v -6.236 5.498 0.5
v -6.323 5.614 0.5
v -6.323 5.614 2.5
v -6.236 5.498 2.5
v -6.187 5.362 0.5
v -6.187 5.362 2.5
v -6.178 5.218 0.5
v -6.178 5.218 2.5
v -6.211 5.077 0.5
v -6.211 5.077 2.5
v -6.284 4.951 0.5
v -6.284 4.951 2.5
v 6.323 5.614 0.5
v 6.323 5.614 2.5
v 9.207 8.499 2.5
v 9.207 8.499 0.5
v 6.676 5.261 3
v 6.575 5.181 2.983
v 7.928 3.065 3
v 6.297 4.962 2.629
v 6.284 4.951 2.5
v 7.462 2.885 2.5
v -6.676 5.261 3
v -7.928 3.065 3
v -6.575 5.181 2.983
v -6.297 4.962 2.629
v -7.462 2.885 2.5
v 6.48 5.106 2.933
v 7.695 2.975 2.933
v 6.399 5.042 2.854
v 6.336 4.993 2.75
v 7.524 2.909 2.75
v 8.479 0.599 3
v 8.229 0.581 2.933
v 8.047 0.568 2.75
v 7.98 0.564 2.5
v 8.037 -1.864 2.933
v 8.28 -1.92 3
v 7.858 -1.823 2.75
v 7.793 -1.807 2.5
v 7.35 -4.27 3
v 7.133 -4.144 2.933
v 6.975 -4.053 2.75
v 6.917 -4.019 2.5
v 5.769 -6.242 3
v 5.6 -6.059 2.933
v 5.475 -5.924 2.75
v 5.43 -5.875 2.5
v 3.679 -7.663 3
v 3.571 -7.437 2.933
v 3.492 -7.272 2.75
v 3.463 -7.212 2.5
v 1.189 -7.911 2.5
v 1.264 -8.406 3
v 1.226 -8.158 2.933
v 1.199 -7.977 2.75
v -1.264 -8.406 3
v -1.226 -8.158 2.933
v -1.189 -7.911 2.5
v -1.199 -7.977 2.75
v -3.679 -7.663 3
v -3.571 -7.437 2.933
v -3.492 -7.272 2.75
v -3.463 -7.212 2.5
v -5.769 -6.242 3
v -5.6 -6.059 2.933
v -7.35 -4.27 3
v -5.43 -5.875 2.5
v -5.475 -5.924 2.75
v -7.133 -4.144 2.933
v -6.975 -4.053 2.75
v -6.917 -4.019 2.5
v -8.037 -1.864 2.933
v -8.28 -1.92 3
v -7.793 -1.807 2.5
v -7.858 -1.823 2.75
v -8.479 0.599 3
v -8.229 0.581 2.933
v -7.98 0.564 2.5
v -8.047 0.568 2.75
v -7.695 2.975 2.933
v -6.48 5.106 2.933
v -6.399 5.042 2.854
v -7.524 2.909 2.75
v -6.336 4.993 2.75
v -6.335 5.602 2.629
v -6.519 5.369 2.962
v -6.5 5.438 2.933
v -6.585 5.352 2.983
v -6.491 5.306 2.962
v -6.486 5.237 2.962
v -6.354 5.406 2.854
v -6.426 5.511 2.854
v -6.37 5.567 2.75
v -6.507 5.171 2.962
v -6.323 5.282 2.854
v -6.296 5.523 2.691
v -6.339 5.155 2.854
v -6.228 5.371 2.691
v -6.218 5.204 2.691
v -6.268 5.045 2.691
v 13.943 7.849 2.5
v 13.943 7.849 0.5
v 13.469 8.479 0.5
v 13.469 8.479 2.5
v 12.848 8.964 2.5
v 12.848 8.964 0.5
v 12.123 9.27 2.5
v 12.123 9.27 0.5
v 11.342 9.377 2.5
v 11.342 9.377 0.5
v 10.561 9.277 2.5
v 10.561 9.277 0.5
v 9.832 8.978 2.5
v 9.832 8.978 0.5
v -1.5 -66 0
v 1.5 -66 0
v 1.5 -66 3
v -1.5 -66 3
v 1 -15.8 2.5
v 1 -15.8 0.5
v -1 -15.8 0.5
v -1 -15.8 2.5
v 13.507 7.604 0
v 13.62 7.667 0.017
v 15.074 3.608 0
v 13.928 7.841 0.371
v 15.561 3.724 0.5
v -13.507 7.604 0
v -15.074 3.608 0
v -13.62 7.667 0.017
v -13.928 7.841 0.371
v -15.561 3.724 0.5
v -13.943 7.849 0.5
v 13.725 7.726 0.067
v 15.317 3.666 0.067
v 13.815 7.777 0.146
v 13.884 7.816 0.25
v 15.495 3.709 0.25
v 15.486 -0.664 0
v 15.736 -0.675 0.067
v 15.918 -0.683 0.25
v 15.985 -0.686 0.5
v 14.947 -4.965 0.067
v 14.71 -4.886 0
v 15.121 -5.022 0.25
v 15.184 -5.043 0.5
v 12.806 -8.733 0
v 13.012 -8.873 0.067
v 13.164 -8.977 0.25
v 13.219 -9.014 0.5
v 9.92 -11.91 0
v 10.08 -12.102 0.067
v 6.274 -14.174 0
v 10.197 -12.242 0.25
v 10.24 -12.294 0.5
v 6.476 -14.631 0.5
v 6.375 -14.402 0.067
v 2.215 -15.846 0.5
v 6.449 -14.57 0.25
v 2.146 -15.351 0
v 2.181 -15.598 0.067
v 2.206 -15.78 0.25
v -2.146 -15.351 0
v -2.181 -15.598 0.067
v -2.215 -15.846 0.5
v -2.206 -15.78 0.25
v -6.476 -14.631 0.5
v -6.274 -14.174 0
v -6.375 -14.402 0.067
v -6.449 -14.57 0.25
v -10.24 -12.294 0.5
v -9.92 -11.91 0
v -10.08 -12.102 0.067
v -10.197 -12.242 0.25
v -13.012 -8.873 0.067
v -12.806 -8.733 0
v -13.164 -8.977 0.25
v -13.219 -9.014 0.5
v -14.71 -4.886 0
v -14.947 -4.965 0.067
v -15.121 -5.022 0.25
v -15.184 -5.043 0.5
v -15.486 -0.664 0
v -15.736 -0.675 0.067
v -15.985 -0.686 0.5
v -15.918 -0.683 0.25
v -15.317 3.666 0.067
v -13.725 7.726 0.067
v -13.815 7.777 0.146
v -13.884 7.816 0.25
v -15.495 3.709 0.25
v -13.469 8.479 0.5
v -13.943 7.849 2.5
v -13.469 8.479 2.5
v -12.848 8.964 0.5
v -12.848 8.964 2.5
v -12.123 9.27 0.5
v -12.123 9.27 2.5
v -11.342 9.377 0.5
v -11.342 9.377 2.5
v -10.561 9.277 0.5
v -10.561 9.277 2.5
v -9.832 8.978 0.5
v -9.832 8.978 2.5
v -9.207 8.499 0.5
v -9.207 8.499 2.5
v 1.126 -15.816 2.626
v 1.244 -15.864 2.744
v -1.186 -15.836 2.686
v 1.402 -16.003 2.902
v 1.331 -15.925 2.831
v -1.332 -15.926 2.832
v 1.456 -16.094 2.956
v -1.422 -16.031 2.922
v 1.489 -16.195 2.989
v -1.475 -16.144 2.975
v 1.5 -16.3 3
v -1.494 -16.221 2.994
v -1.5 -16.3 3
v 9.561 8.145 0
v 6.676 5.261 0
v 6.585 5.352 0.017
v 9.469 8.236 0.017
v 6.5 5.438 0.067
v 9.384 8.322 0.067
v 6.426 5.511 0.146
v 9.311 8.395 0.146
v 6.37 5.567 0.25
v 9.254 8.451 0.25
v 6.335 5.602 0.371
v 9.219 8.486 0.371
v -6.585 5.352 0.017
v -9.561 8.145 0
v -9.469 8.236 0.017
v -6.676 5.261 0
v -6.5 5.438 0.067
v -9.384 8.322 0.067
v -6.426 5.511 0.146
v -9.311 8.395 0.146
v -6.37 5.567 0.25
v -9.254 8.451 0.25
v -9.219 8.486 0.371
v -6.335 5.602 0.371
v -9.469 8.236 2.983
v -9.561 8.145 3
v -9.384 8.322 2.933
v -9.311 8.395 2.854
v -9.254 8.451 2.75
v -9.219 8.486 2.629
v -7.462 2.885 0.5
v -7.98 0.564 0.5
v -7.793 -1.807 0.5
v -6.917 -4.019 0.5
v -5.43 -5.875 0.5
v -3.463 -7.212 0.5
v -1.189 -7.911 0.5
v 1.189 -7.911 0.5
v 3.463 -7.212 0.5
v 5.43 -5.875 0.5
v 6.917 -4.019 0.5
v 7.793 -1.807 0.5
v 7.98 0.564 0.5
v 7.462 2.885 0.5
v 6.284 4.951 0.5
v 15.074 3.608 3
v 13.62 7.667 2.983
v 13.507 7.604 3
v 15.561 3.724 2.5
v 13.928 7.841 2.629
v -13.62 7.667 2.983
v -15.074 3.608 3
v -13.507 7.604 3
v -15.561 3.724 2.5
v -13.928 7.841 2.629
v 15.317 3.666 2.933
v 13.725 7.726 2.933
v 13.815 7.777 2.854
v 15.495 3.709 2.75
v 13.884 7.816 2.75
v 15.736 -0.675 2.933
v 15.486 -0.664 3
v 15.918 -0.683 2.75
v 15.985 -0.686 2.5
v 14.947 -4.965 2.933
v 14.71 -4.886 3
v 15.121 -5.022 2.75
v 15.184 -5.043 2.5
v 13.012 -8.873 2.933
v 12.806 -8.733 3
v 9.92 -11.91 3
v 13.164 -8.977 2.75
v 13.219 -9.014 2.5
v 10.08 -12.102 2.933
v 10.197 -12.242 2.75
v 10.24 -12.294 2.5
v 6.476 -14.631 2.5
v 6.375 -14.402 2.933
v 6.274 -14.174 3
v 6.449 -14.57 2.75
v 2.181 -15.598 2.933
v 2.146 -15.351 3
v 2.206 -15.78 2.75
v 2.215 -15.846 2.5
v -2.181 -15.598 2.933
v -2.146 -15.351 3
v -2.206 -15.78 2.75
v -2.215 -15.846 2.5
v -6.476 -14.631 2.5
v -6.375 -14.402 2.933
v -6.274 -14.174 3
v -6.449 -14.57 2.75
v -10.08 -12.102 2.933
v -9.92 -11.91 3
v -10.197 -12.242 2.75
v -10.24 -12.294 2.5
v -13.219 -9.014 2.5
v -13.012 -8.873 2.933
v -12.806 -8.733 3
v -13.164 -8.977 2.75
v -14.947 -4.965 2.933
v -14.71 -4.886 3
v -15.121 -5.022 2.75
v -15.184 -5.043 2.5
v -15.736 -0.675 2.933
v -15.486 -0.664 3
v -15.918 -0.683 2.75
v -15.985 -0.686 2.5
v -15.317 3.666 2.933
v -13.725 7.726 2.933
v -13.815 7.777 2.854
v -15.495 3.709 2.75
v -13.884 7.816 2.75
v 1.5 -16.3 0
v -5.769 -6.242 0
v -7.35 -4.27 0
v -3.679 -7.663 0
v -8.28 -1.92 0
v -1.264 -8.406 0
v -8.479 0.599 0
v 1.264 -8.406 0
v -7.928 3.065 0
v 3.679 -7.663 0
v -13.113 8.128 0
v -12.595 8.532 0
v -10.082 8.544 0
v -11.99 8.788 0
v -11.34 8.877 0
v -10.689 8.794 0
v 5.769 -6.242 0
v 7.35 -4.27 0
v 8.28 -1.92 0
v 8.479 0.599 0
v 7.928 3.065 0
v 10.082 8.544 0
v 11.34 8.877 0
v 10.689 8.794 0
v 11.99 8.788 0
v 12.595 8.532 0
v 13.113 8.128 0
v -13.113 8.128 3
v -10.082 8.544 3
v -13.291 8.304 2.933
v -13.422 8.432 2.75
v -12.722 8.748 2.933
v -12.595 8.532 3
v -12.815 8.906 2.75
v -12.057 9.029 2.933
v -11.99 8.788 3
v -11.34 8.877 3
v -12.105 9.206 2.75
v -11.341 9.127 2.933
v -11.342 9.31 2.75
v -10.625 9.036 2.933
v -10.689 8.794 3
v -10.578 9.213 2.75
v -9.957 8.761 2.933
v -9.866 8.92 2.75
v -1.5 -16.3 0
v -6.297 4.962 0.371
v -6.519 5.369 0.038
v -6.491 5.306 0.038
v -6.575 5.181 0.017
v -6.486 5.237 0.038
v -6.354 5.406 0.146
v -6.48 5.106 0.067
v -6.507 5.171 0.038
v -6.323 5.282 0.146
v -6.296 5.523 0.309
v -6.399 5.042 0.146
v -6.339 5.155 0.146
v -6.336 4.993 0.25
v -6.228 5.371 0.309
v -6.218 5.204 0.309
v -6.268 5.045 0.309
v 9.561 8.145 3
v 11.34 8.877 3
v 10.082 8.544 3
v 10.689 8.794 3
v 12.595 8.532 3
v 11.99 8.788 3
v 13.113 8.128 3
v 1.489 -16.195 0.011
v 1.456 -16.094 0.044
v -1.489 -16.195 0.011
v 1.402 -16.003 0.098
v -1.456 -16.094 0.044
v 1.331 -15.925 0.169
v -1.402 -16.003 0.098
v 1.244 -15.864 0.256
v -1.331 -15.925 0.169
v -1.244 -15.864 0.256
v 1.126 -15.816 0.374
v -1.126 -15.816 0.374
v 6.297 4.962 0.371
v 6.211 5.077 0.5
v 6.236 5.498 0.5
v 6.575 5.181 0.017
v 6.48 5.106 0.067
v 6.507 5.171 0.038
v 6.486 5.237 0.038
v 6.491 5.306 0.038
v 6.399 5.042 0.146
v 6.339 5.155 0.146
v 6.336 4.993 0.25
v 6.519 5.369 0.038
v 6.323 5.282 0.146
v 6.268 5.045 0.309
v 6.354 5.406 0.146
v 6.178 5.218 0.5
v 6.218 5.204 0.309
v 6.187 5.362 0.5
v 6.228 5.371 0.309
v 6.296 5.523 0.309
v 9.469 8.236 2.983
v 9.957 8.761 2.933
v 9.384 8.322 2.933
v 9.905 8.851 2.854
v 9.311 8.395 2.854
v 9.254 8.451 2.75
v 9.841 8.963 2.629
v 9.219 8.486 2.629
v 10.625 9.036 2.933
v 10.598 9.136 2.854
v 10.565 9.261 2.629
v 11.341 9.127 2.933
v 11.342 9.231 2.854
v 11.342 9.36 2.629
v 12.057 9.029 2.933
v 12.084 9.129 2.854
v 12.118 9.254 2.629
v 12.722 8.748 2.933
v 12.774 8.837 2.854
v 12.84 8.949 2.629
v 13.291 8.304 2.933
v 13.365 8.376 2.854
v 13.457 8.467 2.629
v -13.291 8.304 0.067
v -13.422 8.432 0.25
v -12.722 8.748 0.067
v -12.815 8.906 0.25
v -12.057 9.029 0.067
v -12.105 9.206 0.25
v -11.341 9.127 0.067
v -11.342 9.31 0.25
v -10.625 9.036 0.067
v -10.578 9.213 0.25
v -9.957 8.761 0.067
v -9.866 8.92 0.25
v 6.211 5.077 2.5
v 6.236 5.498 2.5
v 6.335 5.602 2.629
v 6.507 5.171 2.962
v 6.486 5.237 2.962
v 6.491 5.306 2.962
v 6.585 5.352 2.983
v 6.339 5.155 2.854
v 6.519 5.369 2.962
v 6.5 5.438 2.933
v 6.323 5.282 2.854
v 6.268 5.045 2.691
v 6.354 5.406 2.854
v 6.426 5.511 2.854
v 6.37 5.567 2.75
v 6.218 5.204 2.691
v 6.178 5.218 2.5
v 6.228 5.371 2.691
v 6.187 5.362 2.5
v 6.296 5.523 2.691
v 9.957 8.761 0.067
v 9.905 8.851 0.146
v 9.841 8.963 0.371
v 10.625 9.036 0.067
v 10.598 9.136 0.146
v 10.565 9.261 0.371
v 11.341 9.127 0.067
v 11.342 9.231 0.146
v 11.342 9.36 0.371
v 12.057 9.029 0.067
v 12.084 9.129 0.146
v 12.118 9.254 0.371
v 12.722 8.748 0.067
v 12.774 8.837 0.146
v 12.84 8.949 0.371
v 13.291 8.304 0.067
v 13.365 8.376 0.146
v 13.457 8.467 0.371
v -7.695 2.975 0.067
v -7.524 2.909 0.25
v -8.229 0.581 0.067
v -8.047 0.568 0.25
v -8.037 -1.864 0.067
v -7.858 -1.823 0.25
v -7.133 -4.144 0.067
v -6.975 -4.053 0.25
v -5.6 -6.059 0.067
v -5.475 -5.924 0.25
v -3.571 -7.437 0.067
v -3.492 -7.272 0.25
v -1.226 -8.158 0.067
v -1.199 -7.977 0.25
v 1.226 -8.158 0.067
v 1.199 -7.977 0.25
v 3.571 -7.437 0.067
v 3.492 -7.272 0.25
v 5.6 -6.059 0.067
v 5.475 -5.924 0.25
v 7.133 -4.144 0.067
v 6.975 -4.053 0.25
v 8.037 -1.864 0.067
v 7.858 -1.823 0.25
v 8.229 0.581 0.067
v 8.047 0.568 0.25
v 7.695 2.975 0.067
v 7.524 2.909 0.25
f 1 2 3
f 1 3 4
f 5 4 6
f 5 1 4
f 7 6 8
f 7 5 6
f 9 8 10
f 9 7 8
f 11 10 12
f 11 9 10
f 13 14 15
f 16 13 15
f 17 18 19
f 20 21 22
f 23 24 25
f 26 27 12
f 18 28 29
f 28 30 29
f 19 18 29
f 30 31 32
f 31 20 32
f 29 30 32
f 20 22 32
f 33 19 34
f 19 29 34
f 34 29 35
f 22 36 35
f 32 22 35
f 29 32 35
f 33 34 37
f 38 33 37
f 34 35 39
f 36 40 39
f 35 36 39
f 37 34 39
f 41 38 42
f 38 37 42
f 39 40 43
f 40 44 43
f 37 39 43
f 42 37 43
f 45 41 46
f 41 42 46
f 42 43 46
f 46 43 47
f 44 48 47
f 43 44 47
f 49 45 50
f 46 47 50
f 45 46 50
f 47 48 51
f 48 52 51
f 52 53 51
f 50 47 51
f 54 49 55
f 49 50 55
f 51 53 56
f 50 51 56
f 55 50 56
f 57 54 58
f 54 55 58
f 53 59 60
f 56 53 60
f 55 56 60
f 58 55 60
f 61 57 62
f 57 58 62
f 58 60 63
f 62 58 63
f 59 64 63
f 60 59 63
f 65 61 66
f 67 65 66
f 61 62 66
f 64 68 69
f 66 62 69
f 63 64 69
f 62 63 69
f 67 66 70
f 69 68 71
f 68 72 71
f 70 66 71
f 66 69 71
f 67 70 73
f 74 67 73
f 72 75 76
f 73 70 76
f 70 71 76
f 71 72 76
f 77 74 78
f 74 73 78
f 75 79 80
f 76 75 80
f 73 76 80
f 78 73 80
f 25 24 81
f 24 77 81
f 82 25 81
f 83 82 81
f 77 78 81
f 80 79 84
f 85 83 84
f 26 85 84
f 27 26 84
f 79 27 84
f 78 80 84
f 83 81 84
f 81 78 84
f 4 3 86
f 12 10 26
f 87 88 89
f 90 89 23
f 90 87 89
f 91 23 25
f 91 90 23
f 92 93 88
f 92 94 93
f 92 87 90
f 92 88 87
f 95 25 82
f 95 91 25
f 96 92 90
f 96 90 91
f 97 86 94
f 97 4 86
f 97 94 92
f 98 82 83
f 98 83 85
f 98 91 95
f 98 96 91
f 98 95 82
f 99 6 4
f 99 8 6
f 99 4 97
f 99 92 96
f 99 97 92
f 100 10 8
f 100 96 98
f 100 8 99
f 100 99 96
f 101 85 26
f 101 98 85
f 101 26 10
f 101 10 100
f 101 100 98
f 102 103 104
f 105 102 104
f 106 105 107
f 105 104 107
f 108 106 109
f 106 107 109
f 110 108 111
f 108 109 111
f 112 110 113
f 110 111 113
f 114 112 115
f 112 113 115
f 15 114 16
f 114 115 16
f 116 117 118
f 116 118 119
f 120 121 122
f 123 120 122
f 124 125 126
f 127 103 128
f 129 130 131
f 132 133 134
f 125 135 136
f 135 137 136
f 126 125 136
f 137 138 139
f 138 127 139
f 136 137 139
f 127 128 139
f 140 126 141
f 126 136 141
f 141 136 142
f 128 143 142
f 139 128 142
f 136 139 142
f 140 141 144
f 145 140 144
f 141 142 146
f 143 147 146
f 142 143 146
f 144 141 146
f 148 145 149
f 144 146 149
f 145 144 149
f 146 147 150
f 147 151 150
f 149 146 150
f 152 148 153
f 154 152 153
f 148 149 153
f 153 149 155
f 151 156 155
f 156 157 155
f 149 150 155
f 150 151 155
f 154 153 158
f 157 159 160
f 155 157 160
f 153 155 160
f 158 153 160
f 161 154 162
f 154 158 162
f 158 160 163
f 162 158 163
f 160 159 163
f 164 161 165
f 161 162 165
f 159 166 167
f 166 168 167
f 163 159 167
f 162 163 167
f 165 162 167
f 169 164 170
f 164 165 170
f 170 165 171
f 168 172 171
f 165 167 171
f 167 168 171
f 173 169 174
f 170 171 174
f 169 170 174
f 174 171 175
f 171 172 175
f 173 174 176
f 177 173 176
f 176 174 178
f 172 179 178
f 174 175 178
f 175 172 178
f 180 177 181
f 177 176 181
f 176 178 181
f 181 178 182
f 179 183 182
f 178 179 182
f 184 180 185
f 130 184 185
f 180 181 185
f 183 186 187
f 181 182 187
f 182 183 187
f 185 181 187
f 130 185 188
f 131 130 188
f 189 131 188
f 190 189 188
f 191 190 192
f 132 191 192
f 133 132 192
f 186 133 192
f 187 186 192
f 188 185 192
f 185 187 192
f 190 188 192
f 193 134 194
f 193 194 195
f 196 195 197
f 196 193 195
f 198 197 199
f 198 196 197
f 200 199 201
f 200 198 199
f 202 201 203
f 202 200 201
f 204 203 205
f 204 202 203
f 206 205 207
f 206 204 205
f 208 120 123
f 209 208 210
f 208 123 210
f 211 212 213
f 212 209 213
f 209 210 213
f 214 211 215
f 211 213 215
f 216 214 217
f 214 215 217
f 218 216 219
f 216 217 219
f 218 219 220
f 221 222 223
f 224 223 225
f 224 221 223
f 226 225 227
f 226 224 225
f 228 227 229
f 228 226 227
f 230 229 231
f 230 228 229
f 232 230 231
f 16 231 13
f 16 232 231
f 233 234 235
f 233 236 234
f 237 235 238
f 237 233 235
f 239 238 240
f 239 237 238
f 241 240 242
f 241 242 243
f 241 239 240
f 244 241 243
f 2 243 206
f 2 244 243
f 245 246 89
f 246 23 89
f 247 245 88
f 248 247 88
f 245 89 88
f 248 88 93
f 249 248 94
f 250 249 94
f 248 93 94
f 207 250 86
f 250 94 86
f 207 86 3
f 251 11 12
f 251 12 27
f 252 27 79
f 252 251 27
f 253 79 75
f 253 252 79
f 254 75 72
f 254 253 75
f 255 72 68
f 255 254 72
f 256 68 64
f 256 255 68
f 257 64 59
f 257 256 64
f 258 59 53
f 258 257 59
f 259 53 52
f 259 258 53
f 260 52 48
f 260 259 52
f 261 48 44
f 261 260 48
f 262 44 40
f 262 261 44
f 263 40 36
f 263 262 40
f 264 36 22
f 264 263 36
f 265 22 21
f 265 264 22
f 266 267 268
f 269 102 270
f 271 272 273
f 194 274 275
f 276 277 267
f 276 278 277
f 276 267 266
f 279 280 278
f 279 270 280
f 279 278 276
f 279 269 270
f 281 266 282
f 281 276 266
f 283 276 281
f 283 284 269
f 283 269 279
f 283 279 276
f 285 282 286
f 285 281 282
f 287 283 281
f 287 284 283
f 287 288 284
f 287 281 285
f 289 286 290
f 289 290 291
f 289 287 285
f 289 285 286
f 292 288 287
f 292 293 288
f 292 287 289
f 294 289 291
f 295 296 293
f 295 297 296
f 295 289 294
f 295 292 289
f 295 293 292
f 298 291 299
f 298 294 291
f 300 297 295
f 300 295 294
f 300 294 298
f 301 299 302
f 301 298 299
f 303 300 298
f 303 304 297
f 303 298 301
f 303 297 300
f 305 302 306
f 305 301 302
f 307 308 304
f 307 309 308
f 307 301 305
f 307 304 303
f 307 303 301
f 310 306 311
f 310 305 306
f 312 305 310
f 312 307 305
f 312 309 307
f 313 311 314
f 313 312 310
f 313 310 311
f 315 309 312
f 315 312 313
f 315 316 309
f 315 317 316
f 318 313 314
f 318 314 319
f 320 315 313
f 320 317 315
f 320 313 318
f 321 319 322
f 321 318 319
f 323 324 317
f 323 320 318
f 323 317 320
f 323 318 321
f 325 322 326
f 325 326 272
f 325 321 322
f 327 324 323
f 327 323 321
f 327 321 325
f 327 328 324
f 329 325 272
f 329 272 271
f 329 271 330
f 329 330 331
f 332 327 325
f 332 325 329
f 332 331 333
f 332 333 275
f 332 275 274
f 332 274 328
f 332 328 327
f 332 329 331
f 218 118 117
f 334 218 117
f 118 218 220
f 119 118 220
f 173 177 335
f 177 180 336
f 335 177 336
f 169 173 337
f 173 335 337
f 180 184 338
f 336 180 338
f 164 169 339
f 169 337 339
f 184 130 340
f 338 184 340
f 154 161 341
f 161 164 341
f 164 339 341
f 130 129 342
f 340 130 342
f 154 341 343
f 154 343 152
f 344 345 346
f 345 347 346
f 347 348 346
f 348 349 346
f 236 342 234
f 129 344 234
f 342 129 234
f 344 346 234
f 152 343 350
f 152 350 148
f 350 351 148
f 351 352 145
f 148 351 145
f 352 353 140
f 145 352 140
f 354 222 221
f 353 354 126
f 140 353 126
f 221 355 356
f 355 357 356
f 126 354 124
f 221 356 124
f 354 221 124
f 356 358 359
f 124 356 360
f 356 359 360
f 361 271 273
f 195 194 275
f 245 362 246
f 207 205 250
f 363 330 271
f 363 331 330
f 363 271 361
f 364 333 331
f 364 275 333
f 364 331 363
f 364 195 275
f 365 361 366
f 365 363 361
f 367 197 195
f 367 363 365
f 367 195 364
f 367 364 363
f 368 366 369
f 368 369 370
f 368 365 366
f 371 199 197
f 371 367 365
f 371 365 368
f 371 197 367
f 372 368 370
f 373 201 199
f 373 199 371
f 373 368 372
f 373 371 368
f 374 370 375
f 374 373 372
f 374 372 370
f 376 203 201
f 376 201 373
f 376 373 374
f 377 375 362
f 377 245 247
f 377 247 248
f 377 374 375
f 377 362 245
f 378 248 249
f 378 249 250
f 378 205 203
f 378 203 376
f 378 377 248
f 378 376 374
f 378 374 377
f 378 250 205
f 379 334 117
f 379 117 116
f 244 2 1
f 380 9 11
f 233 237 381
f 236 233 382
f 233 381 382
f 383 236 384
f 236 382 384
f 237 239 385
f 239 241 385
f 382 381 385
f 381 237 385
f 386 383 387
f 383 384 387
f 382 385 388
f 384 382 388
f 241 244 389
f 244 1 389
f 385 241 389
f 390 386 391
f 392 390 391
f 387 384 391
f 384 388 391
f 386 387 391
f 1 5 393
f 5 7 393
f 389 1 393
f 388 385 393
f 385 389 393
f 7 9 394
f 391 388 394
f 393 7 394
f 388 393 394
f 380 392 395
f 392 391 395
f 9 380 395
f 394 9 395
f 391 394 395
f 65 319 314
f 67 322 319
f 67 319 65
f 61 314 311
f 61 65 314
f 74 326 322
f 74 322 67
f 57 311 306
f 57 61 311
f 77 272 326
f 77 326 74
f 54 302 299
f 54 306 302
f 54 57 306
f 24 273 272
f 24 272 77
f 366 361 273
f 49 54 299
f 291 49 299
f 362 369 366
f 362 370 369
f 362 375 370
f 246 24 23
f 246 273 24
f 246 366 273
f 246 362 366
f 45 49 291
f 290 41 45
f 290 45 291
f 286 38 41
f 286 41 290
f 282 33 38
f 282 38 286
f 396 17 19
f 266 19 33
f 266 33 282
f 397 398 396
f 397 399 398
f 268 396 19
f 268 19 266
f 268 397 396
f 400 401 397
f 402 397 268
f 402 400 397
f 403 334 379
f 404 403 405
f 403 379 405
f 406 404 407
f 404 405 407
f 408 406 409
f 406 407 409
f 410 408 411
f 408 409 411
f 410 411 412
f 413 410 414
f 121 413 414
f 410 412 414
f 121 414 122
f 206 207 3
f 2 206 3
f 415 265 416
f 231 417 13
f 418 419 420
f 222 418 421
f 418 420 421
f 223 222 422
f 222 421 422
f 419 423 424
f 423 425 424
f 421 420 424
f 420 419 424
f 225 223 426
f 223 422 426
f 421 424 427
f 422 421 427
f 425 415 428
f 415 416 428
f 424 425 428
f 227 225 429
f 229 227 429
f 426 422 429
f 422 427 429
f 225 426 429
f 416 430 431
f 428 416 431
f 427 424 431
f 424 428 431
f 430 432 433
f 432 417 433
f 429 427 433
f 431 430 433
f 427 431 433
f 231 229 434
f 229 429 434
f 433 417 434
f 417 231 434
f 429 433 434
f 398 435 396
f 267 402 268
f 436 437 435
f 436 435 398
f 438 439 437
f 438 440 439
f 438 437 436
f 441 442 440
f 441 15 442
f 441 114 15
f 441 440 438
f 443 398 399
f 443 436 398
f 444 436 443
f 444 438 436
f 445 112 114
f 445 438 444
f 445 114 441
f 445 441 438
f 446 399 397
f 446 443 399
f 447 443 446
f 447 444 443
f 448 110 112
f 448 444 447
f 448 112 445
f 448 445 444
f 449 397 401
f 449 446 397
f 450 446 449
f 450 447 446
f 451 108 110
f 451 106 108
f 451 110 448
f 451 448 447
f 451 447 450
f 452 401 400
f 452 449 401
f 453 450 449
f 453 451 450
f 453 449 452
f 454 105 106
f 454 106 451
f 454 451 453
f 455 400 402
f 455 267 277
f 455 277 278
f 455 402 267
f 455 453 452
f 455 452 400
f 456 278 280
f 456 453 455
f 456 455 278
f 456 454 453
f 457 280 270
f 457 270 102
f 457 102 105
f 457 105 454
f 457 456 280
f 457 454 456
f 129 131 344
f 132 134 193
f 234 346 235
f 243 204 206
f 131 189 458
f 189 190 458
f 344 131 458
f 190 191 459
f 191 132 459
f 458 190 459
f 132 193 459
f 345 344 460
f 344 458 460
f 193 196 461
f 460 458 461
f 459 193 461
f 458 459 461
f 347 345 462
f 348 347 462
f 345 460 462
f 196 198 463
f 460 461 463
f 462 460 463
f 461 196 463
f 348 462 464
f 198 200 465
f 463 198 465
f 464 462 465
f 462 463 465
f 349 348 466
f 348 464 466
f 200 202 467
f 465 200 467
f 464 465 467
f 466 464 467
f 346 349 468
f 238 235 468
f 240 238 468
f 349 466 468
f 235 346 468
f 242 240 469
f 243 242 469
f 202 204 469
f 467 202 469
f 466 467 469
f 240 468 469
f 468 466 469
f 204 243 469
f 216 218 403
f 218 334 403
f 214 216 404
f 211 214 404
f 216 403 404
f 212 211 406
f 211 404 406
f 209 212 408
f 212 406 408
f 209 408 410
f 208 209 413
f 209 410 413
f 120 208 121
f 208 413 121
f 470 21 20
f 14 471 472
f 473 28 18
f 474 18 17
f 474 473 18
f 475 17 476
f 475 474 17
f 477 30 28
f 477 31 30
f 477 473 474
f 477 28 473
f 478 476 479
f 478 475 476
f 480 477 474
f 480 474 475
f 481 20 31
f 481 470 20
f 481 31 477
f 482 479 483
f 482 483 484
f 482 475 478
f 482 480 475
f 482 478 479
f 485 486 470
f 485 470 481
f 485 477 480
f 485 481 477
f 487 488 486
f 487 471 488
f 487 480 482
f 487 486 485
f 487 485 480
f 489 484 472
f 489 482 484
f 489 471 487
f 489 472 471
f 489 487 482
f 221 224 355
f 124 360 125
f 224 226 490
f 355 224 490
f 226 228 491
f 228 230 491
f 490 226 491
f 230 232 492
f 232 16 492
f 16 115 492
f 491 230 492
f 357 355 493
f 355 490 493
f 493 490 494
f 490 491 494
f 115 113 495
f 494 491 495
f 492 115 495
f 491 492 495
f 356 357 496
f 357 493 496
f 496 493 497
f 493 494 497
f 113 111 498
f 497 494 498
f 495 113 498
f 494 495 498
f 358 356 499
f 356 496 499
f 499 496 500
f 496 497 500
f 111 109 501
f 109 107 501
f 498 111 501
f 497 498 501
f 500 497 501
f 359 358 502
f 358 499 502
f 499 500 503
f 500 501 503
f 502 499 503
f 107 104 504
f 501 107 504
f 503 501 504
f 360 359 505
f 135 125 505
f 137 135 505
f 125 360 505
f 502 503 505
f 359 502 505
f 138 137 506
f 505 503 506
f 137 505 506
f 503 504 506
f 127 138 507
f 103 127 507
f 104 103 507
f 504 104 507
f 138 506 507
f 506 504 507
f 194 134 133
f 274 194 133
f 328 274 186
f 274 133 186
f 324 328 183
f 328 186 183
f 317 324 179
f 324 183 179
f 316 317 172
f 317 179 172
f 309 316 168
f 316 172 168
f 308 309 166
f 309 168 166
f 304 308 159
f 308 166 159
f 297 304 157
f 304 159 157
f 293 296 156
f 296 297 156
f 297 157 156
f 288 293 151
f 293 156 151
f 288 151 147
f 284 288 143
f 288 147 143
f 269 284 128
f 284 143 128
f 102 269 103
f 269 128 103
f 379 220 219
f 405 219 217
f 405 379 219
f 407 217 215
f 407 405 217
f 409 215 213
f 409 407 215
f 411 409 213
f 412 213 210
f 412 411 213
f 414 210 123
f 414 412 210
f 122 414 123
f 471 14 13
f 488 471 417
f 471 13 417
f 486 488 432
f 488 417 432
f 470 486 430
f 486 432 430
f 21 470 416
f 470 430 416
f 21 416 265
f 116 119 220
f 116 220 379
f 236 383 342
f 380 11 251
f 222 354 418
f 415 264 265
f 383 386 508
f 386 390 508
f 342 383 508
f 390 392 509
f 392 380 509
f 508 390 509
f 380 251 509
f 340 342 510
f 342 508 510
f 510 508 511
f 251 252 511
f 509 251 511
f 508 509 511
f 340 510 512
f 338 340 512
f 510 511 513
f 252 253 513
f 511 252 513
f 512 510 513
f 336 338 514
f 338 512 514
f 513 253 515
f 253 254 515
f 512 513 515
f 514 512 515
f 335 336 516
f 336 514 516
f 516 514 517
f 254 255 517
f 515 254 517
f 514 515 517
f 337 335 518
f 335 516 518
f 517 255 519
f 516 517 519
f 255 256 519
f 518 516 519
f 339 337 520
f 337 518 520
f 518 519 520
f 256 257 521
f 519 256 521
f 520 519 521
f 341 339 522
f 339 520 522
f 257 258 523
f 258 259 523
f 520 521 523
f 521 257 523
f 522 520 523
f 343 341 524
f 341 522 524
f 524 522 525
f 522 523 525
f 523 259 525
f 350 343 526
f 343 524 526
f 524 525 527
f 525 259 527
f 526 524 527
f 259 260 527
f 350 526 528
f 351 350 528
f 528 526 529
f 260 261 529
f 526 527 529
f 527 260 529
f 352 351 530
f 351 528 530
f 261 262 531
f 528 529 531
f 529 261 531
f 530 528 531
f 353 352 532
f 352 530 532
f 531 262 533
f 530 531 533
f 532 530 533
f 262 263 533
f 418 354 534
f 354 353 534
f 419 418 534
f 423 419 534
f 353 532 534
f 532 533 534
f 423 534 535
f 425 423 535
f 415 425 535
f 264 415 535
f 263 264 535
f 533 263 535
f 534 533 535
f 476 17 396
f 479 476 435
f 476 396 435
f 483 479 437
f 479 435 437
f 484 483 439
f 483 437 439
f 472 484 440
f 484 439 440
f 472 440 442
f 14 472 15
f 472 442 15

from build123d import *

# Parameters (mm, degrees)
SKETCH1_R                = 16
SKETCH1_R_2              = 8
BOSS_EXTRUDE1_DEPTH      = 3
CUT_EXTRUDE1_DEPTH       = 3
FILLET1_R                = 3
FILLET2_R                = 0.5
SKETCH3_W                = 3
SKETCH3_H                = 3
BOSS_EXTRUDE2_DEPTH      = 50
BOSS_EXTRUDE2_DEPTH_BACK = 0.2
FILLET3_R                = 0.5


with BuildPart() as part:
    # Sketch1 → Boss-Extrude1 (new body)
    with BuildSketch(Plane.XY):
        Circle(SKETCH1_R)
        Circle(SKETCH1_R_2, mode=Mode.SUBTRACT)
    extrude(amount=BOSS_EXTRUDE1_DEPTH)

    # Sketch2 → Cut-Extrude1 (cut)
    with BuildSketch(Plane.XY.offset(3)):
        Polygon((-6, 5.291502622), (6, 5.291502622), (18, 17.291502622), (-18, 17.291502622), align=None)
    extrude(amount=-CUT_EXTRUDE1_DEPTH, mode=Mode.SUBTRACT)

    # Fillet1
    fillet1_edges = [part.edges().sort_by_distance(p)[0] for p in [
        (-11.662409807, 10.953912429, 1.5),
        (11.662409807, 10.953912429, 1.5),
    ]]
    fillet(fillet1_edges, radius=FILLET1_R)

    # Fillet2
    fillet2_edges = [part.edges().sort_by_distance(p)[0] for p in [
        (0, -8, 0),
        (-6, 5.291502622, 1.5),
        (7.603509946, 6.895012568, 0),
        (7.603509946, 6.895012568, 3),
        (6, 5.291502622, 1.5),
        (0, -16, 3),
        (0, -16, 0),
        (-7.603509946, 6.895012568, 0),
        (11.736083466, 9.349363918, 0),
        (-11.736083466, 9.349363918, 0),
        (-7.603509946, 6.895012568, 3),
        (11.736083466, 9.349363918, 3),
        (-11.736083466, 9.349363918, 3),
        (0, -8, 3),
    ]]
    fillet(fillet2_edges, radius=FILLET2_R)


with BuildPart() as body_2:
    # Sketch3 → Boss-Extrude2 (new body, two sides)
    with BuildSketch(Plane(origin=(0, -16, 0), x_dir=(-1, 0, 0), z_dir=(0, -1, 0))) as boss_extrude2_sk:
        with Locations((0, -1.5)):
            Rectangle(SKETCH3_W, SKETCH3_H)
    extrude(amount=BOSS_EXTRUDE2_DEPTH)
    extrude(boss_extrude2_sk.sketch, amount=-BOSS_EXTRUDE2_DEPTH_BACK)

    # Fillet3
    fillet3_edges = [body_2.edges().sort_by_distance(p)[0] for p in [
        (1.5, -15.8, 1.5),
        (0, -15.8, 3),
        (-1.5, -15.8, 1.5),
        (0, -15.8, 0),
    ]]
    fillet(fillet3_edges, radius=FILLET3_R)


solid = Compound([part.part, body_2.part])
